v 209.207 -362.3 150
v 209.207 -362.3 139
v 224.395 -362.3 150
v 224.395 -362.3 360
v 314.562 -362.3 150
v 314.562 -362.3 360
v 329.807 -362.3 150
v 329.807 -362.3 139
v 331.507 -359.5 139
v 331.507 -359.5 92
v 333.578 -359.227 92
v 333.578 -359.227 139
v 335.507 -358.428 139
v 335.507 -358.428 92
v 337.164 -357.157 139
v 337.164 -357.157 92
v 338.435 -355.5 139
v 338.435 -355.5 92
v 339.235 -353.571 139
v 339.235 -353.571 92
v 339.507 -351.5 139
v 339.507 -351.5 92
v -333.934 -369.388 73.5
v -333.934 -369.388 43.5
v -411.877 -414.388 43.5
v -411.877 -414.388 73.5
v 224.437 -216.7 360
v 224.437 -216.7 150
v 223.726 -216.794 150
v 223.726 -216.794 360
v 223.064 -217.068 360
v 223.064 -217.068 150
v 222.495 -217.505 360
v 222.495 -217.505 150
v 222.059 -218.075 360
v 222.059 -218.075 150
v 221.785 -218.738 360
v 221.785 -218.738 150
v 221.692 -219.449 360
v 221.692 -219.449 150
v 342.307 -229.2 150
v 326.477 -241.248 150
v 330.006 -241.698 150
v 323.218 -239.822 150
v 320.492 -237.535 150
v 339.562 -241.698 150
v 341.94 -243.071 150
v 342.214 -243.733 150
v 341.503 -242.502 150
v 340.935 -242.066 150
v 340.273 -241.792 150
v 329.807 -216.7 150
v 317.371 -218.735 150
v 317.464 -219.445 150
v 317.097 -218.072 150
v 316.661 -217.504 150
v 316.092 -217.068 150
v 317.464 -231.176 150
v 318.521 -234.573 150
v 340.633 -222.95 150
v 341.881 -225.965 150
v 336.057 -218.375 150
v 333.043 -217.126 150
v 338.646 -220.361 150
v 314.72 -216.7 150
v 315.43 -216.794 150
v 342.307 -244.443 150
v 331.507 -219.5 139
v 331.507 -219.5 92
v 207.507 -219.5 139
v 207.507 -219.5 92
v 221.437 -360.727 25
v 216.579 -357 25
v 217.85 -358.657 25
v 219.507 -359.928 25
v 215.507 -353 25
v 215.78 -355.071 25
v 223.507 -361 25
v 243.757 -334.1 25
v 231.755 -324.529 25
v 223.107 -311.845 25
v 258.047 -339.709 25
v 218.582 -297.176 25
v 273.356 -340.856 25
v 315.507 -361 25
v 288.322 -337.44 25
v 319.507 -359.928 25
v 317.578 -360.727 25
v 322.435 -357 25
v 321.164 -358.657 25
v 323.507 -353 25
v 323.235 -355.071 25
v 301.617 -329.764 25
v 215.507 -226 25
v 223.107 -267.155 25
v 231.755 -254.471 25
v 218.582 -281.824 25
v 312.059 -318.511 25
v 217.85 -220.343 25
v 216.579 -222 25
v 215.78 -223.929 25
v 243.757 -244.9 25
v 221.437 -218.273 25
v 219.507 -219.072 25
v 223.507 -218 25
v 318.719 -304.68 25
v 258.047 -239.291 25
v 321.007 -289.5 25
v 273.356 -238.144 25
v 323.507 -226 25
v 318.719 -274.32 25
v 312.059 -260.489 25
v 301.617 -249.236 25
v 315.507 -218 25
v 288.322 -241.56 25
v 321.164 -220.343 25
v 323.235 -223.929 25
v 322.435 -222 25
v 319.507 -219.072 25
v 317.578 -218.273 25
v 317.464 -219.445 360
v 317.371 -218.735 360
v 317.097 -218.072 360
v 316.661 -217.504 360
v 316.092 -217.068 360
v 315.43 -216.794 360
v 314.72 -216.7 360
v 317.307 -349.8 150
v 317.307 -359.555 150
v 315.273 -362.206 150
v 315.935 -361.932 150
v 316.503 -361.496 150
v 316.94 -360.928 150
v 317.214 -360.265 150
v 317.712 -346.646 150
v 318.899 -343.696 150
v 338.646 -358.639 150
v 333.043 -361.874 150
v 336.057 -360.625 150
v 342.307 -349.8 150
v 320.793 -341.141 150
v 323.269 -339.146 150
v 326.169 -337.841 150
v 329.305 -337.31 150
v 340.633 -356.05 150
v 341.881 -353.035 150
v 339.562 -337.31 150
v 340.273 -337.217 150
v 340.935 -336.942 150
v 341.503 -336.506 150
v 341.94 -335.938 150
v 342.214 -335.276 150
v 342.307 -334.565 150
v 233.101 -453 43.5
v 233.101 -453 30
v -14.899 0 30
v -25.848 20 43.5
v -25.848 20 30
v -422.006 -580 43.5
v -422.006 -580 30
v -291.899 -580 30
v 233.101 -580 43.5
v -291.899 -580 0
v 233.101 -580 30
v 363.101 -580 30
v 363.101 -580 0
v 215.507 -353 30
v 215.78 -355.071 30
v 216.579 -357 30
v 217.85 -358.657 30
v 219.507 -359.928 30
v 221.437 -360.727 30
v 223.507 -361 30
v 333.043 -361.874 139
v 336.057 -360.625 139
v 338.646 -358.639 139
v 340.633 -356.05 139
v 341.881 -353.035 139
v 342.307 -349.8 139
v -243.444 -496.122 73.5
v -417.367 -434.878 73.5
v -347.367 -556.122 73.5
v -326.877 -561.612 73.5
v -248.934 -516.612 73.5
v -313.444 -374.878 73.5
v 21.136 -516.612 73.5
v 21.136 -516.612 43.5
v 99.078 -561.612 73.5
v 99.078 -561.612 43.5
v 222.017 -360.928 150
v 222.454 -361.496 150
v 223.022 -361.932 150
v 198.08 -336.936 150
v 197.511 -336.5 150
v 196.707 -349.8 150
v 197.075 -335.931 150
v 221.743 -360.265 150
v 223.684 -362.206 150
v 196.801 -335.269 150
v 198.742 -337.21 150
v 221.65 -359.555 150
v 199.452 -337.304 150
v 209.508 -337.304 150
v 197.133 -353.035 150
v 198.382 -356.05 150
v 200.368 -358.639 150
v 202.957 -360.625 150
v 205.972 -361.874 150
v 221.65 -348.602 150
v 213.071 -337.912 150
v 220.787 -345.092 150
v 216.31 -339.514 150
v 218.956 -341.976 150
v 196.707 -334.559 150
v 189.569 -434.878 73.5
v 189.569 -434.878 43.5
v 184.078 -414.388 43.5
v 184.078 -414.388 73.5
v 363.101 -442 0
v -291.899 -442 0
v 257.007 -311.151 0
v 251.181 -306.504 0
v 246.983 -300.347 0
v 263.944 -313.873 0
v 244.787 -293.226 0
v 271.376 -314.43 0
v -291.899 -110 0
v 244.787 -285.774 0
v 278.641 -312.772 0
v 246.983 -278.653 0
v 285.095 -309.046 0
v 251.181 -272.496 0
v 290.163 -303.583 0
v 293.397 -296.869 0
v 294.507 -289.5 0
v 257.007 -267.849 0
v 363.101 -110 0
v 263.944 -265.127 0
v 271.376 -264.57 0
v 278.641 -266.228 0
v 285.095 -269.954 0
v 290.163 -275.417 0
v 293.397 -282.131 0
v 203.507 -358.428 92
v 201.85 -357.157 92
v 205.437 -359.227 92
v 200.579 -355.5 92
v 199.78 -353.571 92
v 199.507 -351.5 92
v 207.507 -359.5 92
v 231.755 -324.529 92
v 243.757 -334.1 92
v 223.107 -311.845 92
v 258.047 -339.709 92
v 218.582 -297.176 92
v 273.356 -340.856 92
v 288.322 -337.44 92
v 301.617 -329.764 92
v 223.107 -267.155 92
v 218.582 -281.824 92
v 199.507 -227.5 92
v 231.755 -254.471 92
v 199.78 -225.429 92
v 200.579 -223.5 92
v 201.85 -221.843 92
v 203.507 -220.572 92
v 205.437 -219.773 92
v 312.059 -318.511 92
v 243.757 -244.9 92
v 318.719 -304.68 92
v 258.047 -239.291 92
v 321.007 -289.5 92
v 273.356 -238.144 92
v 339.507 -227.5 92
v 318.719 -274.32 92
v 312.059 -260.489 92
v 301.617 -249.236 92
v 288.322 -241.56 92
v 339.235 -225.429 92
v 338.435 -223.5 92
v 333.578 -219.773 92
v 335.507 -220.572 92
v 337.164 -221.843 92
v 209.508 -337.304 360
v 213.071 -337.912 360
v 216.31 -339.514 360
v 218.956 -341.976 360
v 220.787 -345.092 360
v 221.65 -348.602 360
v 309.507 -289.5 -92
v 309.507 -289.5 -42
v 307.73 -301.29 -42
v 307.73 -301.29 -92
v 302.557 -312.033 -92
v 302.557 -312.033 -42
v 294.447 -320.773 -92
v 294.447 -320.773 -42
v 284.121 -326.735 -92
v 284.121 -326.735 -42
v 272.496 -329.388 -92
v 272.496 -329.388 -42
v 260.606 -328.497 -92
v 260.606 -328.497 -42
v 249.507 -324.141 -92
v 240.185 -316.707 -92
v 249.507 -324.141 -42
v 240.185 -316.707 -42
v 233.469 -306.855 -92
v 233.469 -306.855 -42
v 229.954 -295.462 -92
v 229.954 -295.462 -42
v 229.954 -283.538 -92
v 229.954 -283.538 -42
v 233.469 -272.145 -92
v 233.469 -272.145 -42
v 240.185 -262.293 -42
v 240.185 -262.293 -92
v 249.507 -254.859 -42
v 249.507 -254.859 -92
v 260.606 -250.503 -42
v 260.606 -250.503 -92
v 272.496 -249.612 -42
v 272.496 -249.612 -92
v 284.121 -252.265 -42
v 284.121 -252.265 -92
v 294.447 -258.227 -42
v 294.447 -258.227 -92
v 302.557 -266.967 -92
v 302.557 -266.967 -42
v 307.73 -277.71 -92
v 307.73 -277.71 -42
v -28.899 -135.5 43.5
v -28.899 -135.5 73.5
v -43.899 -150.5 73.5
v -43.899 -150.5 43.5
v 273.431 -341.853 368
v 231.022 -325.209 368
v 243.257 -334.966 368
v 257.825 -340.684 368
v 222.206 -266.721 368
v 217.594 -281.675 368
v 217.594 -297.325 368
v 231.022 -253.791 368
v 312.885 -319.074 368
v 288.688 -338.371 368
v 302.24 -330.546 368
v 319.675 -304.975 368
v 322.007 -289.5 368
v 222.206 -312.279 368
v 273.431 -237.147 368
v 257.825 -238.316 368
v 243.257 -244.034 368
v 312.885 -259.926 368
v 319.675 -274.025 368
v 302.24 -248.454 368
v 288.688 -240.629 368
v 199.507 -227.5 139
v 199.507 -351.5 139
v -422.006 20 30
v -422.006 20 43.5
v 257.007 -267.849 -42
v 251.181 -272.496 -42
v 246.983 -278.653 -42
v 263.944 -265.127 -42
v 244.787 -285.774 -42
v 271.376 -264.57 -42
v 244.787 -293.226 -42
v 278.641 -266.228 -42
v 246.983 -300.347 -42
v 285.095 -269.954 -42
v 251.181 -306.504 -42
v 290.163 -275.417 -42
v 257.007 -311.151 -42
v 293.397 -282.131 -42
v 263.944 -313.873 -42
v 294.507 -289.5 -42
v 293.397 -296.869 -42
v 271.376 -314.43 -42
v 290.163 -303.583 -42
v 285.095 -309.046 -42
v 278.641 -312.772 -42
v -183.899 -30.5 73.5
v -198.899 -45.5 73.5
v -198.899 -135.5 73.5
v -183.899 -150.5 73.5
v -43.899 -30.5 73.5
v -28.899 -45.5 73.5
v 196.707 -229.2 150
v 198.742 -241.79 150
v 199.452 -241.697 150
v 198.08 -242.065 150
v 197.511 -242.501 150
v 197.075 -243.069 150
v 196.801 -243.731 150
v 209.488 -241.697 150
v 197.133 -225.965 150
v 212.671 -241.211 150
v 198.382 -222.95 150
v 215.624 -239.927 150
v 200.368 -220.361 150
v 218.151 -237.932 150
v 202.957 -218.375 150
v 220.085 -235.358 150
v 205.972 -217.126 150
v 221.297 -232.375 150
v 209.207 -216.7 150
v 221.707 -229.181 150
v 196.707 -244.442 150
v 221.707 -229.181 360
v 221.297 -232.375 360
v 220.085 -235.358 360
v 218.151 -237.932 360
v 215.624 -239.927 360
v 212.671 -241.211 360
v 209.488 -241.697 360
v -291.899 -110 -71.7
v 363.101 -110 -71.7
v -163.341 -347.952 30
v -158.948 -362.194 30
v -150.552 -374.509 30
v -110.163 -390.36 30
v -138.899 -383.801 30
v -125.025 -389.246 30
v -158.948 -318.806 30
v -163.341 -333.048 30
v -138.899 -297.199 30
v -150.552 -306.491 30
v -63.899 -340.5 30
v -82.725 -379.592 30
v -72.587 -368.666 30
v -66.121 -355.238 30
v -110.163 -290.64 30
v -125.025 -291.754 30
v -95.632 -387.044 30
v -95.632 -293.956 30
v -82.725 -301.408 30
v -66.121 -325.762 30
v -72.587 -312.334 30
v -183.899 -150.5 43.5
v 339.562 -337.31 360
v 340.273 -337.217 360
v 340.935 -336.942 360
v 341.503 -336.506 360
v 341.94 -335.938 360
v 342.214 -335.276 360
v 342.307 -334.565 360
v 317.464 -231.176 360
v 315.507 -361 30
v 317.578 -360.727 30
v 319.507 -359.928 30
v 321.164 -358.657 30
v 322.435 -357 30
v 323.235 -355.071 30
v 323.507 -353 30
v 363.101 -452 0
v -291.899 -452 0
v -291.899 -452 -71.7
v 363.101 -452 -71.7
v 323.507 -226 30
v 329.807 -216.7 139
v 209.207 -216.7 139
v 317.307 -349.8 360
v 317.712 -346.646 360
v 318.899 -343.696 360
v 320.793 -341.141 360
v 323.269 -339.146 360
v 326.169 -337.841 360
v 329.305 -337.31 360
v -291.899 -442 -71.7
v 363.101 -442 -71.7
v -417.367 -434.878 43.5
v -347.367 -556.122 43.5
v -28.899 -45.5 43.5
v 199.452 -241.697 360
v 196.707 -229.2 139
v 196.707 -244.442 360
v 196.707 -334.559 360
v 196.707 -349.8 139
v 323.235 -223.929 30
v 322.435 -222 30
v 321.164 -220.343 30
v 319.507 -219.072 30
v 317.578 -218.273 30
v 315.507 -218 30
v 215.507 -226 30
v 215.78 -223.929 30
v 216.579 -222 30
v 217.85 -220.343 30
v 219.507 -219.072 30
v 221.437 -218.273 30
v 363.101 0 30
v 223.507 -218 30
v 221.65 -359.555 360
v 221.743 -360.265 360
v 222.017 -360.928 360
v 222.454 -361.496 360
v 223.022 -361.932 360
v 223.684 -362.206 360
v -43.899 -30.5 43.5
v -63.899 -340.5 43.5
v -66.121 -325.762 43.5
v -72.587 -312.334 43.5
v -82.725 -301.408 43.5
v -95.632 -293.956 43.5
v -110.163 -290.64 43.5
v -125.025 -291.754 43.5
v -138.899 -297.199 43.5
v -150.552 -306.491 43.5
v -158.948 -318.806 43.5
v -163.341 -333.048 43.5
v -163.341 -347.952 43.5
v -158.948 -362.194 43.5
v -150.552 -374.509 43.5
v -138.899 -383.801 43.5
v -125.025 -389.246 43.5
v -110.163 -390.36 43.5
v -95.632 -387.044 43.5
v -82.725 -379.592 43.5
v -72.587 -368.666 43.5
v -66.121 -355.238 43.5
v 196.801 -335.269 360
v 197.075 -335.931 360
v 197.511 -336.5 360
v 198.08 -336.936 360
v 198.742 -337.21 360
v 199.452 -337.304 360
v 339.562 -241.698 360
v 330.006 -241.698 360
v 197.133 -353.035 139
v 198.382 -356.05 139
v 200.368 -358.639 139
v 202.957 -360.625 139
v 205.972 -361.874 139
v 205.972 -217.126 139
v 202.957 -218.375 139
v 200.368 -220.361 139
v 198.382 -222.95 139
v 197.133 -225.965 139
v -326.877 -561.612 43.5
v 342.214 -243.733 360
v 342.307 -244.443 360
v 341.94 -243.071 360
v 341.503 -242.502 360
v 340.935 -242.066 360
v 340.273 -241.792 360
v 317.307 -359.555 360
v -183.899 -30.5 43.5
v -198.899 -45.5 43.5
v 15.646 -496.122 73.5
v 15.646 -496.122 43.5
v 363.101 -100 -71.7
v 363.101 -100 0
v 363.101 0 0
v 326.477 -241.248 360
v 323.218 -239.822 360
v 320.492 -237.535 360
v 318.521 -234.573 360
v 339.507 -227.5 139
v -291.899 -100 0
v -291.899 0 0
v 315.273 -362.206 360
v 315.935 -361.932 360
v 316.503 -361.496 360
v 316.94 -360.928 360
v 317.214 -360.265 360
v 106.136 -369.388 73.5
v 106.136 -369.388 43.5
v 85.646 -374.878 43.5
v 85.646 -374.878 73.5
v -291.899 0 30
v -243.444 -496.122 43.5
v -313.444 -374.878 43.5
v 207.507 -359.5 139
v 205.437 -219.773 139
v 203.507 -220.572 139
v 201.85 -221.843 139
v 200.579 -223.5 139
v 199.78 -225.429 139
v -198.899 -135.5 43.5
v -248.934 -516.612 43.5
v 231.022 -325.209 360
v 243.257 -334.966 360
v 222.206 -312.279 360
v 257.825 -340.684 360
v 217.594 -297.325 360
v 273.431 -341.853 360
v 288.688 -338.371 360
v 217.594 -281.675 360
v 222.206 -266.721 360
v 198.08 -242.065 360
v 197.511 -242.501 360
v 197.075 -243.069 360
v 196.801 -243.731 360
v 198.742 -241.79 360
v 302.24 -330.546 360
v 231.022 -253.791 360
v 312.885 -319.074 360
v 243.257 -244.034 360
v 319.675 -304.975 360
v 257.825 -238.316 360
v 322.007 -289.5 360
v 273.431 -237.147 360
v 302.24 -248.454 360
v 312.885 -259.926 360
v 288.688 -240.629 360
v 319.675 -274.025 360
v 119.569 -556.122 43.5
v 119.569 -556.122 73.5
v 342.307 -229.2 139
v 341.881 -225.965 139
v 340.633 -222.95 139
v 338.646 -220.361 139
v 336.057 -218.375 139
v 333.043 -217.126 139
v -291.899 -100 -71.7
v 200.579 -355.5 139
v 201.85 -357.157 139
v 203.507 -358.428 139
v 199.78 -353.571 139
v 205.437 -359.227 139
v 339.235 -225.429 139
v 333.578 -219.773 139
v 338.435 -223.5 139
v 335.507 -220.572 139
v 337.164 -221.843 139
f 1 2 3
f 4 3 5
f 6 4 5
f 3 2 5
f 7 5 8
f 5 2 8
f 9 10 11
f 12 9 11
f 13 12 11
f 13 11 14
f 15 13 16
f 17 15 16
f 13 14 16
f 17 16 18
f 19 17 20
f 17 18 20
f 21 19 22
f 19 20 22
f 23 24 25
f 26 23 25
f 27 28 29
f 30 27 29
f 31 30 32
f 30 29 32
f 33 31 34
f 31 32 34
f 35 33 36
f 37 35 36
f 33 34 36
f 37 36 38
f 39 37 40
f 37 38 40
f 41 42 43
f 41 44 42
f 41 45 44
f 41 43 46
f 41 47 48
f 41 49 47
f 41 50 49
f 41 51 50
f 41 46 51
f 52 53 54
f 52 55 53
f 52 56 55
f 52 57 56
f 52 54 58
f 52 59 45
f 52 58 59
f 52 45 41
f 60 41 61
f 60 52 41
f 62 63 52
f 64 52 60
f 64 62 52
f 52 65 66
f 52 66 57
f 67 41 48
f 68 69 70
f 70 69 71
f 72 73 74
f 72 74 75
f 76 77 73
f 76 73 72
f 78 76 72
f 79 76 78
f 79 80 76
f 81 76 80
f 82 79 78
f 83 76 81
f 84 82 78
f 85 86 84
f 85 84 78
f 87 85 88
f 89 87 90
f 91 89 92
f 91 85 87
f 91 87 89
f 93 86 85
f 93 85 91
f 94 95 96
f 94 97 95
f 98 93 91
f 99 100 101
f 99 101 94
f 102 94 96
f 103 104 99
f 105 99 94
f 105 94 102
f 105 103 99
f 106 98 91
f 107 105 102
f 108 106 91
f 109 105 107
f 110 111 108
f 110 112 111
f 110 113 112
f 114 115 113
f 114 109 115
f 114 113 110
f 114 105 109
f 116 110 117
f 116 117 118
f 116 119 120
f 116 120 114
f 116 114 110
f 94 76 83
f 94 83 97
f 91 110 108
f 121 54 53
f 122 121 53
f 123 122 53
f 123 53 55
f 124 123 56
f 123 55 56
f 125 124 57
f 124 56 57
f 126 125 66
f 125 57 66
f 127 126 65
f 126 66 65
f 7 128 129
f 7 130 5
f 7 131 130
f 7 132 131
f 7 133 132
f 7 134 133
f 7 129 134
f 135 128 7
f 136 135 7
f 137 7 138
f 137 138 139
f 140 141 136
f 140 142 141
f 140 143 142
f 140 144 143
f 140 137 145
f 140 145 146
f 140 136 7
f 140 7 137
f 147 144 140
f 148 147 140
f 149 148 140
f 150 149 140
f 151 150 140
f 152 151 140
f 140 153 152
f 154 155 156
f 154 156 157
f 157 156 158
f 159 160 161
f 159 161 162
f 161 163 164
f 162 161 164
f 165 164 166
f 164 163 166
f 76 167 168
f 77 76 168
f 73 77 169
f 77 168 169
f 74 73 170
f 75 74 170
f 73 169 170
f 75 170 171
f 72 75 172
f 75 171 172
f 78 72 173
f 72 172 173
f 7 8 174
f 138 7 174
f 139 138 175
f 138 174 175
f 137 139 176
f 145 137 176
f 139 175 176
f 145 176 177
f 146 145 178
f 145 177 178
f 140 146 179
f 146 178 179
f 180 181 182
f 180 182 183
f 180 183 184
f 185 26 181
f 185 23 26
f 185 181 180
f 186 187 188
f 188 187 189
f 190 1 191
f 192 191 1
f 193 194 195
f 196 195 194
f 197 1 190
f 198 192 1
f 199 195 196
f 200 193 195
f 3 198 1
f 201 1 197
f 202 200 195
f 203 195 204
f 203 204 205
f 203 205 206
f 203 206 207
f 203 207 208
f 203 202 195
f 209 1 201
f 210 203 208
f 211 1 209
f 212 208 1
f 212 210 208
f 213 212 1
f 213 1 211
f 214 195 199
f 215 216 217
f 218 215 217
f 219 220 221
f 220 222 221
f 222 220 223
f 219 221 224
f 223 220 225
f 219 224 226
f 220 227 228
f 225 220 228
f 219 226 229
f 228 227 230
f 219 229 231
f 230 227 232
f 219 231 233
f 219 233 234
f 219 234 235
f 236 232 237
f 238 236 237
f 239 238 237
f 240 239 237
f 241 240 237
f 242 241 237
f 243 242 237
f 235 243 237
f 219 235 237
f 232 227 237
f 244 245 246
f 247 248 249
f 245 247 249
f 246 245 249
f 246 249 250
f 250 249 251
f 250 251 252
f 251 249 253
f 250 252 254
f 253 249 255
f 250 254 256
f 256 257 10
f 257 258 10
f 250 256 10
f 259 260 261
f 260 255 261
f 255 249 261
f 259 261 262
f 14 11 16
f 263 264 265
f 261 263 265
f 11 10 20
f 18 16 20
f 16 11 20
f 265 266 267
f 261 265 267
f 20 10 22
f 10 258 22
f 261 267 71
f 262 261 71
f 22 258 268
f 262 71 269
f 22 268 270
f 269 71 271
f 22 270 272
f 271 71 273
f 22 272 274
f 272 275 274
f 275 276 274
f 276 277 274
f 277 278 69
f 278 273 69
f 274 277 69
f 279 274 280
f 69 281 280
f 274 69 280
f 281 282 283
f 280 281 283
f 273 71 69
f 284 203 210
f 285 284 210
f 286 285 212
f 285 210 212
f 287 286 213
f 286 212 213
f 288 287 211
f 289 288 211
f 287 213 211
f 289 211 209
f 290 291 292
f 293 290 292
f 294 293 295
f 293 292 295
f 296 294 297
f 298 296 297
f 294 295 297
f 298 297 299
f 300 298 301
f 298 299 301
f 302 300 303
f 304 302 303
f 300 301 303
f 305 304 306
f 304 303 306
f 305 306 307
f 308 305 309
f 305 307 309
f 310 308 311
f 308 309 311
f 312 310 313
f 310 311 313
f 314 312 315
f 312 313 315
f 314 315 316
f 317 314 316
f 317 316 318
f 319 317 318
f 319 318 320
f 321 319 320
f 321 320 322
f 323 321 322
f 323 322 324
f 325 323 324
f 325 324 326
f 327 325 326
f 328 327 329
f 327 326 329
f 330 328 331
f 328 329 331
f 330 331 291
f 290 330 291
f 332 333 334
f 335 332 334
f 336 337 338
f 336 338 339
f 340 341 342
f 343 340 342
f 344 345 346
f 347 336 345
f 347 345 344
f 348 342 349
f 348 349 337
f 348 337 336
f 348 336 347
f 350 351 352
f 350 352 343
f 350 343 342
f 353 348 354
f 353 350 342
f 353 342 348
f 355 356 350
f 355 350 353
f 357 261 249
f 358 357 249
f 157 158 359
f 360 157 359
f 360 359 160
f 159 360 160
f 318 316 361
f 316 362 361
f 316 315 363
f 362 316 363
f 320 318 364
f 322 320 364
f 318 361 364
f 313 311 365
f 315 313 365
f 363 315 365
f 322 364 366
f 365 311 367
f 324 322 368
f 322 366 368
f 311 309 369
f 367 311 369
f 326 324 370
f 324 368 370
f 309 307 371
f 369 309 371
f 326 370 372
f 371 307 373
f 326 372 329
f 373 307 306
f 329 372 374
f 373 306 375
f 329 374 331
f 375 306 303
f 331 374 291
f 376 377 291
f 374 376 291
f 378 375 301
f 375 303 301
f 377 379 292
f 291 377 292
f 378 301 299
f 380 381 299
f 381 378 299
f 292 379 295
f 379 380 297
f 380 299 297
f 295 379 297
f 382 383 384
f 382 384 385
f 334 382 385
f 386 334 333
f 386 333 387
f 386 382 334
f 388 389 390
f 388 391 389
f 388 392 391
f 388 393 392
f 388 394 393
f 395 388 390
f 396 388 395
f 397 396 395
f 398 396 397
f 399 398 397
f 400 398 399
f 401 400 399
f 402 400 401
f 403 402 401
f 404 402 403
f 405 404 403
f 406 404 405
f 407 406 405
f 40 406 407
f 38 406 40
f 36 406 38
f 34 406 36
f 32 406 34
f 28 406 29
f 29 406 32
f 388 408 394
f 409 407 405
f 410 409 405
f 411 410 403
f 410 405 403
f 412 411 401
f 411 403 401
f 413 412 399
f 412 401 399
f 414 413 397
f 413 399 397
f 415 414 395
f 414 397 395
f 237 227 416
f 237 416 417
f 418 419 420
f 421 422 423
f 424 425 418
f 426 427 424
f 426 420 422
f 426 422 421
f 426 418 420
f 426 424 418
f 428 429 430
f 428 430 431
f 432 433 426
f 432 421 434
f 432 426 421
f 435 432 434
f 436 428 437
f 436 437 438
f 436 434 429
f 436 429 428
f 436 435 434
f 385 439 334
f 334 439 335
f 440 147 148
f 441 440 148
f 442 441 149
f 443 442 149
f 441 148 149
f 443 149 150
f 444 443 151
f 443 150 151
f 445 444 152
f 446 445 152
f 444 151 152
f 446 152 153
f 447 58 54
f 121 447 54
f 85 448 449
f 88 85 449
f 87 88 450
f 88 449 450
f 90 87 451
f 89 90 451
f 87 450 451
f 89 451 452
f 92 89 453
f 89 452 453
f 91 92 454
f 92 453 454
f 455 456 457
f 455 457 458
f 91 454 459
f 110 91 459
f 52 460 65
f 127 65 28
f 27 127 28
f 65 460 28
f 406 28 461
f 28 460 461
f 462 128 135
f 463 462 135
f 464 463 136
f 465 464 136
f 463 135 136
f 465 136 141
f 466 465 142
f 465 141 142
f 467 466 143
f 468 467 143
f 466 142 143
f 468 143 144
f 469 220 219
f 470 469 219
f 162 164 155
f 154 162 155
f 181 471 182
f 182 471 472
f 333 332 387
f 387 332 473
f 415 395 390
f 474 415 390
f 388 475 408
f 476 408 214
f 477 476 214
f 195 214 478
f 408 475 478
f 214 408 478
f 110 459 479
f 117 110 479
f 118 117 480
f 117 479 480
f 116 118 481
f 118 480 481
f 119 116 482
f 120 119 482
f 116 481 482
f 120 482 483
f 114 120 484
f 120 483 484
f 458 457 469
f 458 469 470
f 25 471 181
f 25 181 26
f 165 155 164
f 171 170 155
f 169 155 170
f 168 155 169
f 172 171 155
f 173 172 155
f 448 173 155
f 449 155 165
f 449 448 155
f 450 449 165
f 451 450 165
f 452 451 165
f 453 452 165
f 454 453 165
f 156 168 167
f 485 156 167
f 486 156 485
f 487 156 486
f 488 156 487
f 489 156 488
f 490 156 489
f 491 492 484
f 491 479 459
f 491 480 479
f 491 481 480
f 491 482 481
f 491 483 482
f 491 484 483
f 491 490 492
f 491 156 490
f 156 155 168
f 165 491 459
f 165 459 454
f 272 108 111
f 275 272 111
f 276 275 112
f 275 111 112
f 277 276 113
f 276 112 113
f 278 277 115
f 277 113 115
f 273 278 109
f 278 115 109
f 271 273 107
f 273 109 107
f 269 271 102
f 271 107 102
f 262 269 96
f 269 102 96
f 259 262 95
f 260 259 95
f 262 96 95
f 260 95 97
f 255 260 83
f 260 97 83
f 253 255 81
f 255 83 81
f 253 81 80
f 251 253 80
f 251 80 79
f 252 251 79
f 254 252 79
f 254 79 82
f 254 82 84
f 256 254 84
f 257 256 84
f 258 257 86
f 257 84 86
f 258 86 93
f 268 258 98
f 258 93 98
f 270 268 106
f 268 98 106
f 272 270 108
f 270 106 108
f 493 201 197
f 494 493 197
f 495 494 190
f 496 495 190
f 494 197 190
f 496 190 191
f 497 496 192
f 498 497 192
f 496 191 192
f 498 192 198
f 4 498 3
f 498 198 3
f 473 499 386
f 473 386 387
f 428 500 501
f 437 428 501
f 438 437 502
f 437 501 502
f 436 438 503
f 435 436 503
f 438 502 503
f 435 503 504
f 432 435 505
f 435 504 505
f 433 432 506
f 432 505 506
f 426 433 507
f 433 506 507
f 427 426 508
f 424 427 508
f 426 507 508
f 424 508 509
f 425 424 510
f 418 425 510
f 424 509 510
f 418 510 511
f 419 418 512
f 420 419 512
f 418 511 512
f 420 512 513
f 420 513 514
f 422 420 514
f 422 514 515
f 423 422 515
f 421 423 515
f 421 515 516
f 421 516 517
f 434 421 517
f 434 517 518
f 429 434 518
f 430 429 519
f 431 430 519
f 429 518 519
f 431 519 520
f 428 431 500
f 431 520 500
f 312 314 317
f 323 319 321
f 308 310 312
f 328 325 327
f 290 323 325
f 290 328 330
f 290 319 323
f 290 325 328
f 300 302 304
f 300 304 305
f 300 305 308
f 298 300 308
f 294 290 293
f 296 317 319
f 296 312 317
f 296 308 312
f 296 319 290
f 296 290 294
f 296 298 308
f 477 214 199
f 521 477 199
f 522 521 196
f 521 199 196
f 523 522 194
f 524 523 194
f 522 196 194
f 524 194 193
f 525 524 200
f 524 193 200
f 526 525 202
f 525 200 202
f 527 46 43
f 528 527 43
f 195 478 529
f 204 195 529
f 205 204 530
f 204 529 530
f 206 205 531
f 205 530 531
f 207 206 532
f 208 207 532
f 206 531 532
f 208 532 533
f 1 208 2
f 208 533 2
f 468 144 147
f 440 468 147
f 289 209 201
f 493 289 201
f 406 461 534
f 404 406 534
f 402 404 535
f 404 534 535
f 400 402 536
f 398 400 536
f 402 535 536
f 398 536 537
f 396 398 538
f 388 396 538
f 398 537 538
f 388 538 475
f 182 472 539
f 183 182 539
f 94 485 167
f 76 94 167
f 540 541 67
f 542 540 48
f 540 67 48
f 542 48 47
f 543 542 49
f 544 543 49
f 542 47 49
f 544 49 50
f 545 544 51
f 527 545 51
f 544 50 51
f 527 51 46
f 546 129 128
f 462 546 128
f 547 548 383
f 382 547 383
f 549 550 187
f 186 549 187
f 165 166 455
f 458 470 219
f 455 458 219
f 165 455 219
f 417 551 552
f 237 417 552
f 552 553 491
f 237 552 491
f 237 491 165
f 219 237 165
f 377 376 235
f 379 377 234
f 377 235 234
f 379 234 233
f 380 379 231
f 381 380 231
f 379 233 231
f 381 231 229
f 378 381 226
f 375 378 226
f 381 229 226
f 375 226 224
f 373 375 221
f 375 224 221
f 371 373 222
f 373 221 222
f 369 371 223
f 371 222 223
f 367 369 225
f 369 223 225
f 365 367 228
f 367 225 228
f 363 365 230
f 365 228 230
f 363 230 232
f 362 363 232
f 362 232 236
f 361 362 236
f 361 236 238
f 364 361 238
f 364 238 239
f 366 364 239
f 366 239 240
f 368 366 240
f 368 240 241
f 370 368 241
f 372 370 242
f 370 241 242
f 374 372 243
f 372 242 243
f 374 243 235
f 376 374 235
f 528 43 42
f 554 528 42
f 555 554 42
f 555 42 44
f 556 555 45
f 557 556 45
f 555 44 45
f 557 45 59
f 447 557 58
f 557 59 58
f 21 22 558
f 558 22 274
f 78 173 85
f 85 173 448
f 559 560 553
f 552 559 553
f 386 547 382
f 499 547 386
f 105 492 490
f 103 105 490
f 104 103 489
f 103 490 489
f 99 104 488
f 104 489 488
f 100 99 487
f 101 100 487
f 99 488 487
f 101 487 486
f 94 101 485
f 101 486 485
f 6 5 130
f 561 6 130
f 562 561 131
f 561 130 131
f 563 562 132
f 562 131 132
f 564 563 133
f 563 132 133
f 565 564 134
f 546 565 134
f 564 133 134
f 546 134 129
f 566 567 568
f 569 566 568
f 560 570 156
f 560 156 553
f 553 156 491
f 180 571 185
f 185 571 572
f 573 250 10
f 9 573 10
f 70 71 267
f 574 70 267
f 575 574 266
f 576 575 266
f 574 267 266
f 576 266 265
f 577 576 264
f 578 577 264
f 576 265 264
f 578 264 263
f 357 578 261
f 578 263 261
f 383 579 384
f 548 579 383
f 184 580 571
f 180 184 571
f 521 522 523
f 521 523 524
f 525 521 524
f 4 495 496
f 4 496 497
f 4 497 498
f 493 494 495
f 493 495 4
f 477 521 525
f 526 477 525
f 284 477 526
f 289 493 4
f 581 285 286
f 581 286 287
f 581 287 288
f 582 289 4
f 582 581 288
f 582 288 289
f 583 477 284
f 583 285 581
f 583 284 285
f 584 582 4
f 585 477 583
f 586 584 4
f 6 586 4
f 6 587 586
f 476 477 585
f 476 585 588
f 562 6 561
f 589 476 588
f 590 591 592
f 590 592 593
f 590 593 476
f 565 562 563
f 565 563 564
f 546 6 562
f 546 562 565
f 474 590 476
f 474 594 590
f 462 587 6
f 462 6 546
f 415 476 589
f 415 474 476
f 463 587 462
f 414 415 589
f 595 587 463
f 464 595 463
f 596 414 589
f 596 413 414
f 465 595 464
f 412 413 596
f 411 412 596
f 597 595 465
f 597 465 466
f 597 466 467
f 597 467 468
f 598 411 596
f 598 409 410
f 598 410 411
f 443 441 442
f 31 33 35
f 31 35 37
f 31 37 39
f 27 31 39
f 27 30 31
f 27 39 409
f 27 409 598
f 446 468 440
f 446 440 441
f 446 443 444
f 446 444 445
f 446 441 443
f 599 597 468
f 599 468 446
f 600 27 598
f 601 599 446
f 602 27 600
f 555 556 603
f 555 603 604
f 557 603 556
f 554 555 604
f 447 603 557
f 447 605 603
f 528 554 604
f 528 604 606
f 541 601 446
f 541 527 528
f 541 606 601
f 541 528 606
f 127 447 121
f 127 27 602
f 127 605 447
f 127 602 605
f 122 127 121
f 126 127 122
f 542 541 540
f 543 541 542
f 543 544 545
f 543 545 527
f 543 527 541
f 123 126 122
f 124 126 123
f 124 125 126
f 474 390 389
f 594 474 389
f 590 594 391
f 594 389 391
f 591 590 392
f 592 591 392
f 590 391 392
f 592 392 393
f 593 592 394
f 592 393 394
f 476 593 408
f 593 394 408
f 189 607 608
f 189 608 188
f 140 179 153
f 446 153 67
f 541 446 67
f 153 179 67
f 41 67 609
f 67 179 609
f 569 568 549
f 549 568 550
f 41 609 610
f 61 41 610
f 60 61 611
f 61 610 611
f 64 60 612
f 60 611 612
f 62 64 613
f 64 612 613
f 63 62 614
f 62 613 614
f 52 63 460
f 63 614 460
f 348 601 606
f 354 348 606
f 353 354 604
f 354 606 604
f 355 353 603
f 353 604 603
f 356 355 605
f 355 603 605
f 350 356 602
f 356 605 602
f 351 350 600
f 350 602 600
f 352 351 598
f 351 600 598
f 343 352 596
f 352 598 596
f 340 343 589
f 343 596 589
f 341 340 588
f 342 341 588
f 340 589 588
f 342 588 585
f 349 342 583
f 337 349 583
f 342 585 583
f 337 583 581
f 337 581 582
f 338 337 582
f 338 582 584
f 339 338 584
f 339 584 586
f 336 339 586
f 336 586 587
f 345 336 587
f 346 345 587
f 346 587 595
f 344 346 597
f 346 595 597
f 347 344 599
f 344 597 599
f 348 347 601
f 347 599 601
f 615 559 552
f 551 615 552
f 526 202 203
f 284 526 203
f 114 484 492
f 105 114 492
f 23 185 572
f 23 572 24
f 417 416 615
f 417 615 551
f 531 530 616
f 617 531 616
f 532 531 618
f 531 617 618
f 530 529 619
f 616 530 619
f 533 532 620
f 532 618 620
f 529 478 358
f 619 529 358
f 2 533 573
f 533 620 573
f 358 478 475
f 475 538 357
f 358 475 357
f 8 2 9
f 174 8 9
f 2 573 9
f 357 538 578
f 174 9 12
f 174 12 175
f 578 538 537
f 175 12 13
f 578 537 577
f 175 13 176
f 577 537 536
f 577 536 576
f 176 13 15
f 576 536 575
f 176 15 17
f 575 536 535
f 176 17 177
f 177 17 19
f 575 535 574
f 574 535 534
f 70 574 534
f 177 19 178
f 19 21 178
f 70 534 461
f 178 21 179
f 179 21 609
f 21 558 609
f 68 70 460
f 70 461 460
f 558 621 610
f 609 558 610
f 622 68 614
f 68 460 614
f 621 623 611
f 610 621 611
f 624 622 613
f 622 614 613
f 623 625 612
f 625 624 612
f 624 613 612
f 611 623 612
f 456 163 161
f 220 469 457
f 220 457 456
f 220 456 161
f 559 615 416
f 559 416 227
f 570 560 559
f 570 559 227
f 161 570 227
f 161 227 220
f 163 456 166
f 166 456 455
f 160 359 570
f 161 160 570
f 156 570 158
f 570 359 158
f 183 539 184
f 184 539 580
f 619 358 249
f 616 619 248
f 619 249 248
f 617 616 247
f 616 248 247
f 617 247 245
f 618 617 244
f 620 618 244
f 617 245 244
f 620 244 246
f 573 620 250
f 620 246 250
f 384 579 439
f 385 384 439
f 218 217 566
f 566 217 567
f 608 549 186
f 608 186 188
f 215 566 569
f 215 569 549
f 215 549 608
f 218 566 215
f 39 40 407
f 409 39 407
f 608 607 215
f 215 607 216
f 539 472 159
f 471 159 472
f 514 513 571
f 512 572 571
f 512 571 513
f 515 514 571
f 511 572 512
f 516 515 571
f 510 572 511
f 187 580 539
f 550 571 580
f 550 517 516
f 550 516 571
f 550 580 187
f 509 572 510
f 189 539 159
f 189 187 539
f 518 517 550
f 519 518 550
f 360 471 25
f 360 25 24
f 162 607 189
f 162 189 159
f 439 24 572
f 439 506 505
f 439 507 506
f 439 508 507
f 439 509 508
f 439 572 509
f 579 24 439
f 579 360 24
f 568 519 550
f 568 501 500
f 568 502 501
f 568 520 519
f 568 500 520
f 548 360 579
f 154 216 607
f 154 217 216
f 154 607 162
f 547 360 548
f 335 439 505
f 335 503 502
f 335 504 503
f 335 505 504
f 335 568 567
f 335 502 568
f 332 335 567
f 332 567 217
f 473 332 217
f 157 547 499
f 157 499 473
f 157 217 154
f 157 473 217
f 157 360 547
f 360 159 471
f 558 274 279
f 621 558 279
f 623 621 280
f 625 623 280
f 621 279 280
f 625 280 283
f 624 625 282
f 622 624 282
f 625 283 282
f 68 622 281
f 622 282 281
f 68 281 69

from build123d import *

# Parameters (mm, degrees)
F0_W         = 655
F0_H         = 30
F1_DEPTH     = 580
F3_DEPTH     = 13.5
F5_DEPTH     = 5
F6_R         = 51.5
F7_DEPTH     = 67
F9_DEPTH     = 47
F11_DEPTH    = 11
F13_DEPTH    = 210
F14_R        = 52.5
F15_DEPTH    = 8
F16_R        = 50
F17_DEPTH    = 13.5
F18_W        = 170
F18_H        = 120
F19_DEPTH    = 30
F20_SIZE     = 15
F21_T1_DEPTH = 68.5752448195
F22_W        = 655
F22_H        = 10
F23_DEPTH    = 71.7
F24_R        = 25
F25_DEPTH    = 42
F26_R        = 40
F27_DEPTH    = 50


# Not quite as in the source:
# - a fillet or chamfer that OpenCascade refuses, or shapes differently, is made with other operations: its cross-section is extruded or revolved along the edge and cut away or added


with BuildPart() as f1:
    # F0 (on Front) → F1 (new body)
    with BuildSketch(Plane.XZ):
        with Locations((35.6008394094, 15)):
            Rectangle(F0_W, F0_H)
    extrude(amount=F1_DEPTH)

    # F2 (on face) → F3 (join)
    with BuildSketch(Plane.XY.offset(30)):
        Polygon((-422.0060110092, -580), (233.1008394094, -580), (233.1008394094, -453), (-25.8483879637, 20), (-422.0060110092, 20), align=None)
    extrude(amount=F3_DEPTH)

    # F4 (on face) → F5 (cut)
    with BuildSketch(Plane.XY.offset(30)):
        with BuildLine():
            Line((315.5072791576, -218), (223.5072791576, -218))
            ThreePointArc((223.5072791576, -218), (217.8504249081, -220.3431457505), (215.5072791576, -226))
            Line((215.5072791576, -226), (215.5072791576, -353))
            ThreePointArc((215.5072791576, -353), (217.8504249081, -358.6568542495), (223.5072791576, -361))
            Line((223.5072791576, -361), (315.5072791576, -361))
            ThreePointArc((315.5072791576, -361), (321.1641334071, -358.6568542495), (323.5072791576, -353))
            Line((323.5072791576, -353), (323.5072791576, -226))
            ThreePointArc((323.5072791576, -226), (321.1641334071, -220.3431457505), (315.5072791576, -218))
        make_face()
    extrude(amount=-F5_DEPTH, mode=Mode.SUBTRACT)

    # F6 (on face) → F7 (join)
    with BuildSketch(Plane.XY.offset(25)):
        with Locations((269.5072791576, -289.5)):
            Circle(F6_R)
    extrude(amount=F7_DEPTH)

    # F8 (on face) → F9 (join)
    with BuildSketch(Plane.XY.offset(92)):
        with BuildLine():
            Line((331.5072791576, -219.5), (207.5072791576, -219.5))
            ThreePointArc((207.5072791576, -219.5), (201.8504249081, -221.8431457505), (199.5072791576, -227.5))
            Line((199.5072791576, -227.5), (199.5072791576, -351.5))
            ThreePointArc((199.5072791576, -351.5), (201.8504249081, -357.1568542495), (207.5072791576, -359.5))
            Line((207.5072791576, -359.5), (331.5072791576, -359.5))
            ThreePointArc((331.5072791576, -359.5), (337.1641334071, -357.1568542495), (339.5072791576, -351.5))
            Line((339.5072791576, -351.5), (339.5072791576, -227.5))
            ThreePointArc((339.5072791576, -227.5), (337.1641334071, -221.8431457505), (331.5072791576, -219.5))
        make_face()
    extrude(amount=F9_DEPTH)

    # F10 (on face) → F11 (join)
    with BuildSketch(Plane.XY.offset(139)):
        with BuildLine():
            Line((329.8072791576, -216.7), (209.2072791576, -216.7))
            ThreePointArc((209.2072791576, -216.7), (200.3684443928, -220.3611652352), (196.7072791576, -229.2))
            Line((196.7072791576, -229.2), (196.7072791576, -349.8))
            ThreePointArc((196.7072791576, -349.8), (200.3684443928, -358.6388347648), (209.2072791576, -362.3))
            Line((209.2072791576, -362.3), (329.8072791576, -362.3))
            ThreePointArc((329.8072791576, -362.3), (338.6461139225, -358.6388347648), (342.3072791576, -349.8))
            Line((342.3072791576, -349.8), (342.3072791576, -229.2))
            ThreePointArc((342.3072791576, -229.2), (338.6461139225, -220.3611652352), (329.8072791576, -216.7))
        make_face()
    extrude(amount=F11_DEPTH)

    # F12 (on face) → F13 (join)
    with BuildSketch(Plane.XY.offset(150)):
        with BuildLine():
            ThreePointArc((221.6497197978, -359.5550261631), (222.4537040204, -361.4960157773), (224.3946936347, -362.3))
            Line((224.3946936347, -362.3), (314.5623053207, -362.3))
            ThreePointArc((314.5623053207, -362.3), (316.503294935, -361.4960157773), (317.3072791576, -359.5550261631))
            Line((317.3072791576, -359.5550261631), (317.3072791576, -349.8))
            ThreePointArc((317.3072791576, -349.8), (320.7925325094, -341.1406499743), (329.3047740164, -337.3101045407))
            ThreePointArc((329.3047740164, -337.3101045407), (329.8072791576, -337.3), (330.3097842989, -337.3101045407))
            Line((330.3097842989, -337.3101045407), (339.5623053207, -337.3101045407))
            ThreePointArc((339.5623053207, -337.3101045407), (341.503294935, -336.5061203181), (342.3072791576, -334.5651307038))
            Line((342.3072791576, -334.5651307038), (342.3072791576, -244.4433875239))
            ThreePointArc((342.3072791576, -244.4433875239), (341.503294935, -242.5023979096), (339.5623053207, -241.698413687))
            Line((339.5623053207, -241.698413687), (330.006415567, -241.698413687))
            ThreePointArc((330.006415567, -241.698413687), (321.7732212328, -238.7762160199), (317.4644895357, -231.1762450125))
            ThreePointArc((317.4644895357, -231.1762450125), (317.3072791576, -229.2), (317.4644895357, -227.2237549875))
            Line((317.4644895357, -227.2237549875), (317.4644895357, -219.4449738369))
            ThreePointArc((317.4644895357, -219.4449738369), (316.6605053131, -217.5039842227), (314.7195156988, -216.7))
            Line((314.7195156988, -216.7), (224.4374317064, -216.7))
            ThreePointArc((224.4374317064, -216.7), (222.4949663799, -217.5054610577), (221.6924610453, -219.4491493681))
            Line((221.6924610453, -219.4491493681), (221.7072646957, -229.18098556))
            ThreePointArc((221.7072646957, -229.18098556), (218.1514308097, -237.9322477762), (209.4879256393, -241.696849105))
            ThreePointArc((209.4879256393, -241.696849105), (209.2072791576, -241.7), (208.926632676, -241.696849105))
            Line((208.926632676, -241.696849105), (199.4522529946, -241.696849105))
            ThreePointArc((199.4522529946, -241.696849105), (197.5112633803, -242.5008333276), (196.7072791576, -244.4418229419))
            Line((196.7072791576, -244.4418229419), (196.7072791576, -334.5586429094))
            ThreePointArc((196.7072791576, -334.5586429094), (197.5112633803, -336.4996325237), (199.4522529946, -337.3036167464))
            Line((199.4522529946, -337.3036167464), (208.906603954, -337.3036167464))
            ThreePointArc((208.906603954, -337.3036167464), (209.2072791576, -337.3), (209.5079543613, -337.3036167464))
            ThreePointArc((209.5079543613, -337.3036167464), (217.722501739, -340.6489899798), (221.6497197978, -348.6018051423))
            ThreePointArc((221.6497197978, -348.6018051423), (221.7072791576, -349.8), (221.6497197978, -350.9981948577))
            Line((221.6497197978, -350.9981948577), (221.6497197978, -359.5550261631))
        make_face()
        with BuildLine():
            Line((221.6497197978, -348.6018051423), (221.6497197978, -350.9981948577))
            ThreePointArc((221.6497197978, -350.9981948577), (221.7072791576, -349.8), (221.6497197978, -348.6018051423))
        make_face()
        with BuildLine():
            ThreePointArc((330.3097842989, -337.3101045407), (329.8072791576, -337.3), (329.3047740164, -337.3101045407))
            Line((329.3047740164, -337.3101045407), (330.3097842989, -337.3101045407))
        make_face()
        with BuildLine():
            Line((208.906603954, -337.3036167464), (209.5079543613, -337.3036167464))
            ThreePointArc((209.5079543613, -337.3036167464), (209.2072791576, -337.3), (208.906603954, -337.3036167464))
        make_face()
        with BuildLine():
            Line((209.4879256393, -241.696849105), (208.926632676, -241.696849105))
            ThreePointArc((208.926632676, -241.696849105), (209.2072791576, -241.7), (209.4879256393, -241.696849105))
        make_face()
        with BuildLine():
            ThreePointArc((317.4644895357, -227.2237549875), (317.3072791576, -229.2), (317.4644895357, -231.1762450125))
            Line((317.4644895357, -231.1762450125), (317.4644895357, -227.2237549875))
        make_face()
    extrude(amount=F13_DEPTH)

    # F14 (on face) → F15 (join)
    with BuildSketch(Plane.XY.offset(360)):
        with Locations((269.5072791576, -289.5)):
            Circle(F14_R)
    extrude(amount=F15_DEPTH)

    # F16 (on face) → F17 (cut)
    with BuildSketch(Plane.XY.offset(43.5)):
        with Locations((-113.8991605906, -340.5)):
            Circle(F16_R)
    extrude(amount=-F17_DEPTH, mode=Mode.SUBTRACT)

    # F18 (on face) → F19 (join)
    with BuildSketch(Plane.XY.offset(43.5)):
        with Locations((-113.8991605906, -90.5)):
            Rectangle(F18_W, F18_H)
        Polygon((-424.8670357638, -421.8878406783), (-339.8670357638, -569.1121593217), (-235.9439873097, -509.1121593217), (-320.9439873097, -361.8878406783), align=None)
        Polygon((112.0687145825, -569.1121593217), (197.0687145825, -421.8878406783), (93.1456661284, -361.8878406783), (8.1456661284, -509.1121593217), align=None)
    extrude(amount=F19_DEPTH)

    # F20
    f20_edges = [f1.edges().sort_by_distance(p)[0] for p in [
        (-198.899161, -30.5, 58.5),
    ]]
    chamfer(f20_edges, length=F20_SIZE)

    # F21: chamfer of 15 on 11 edges, made by hand

    # F21_s2 → F21_t1 (cut)
    with BuildSketch(Plane.XY.offset(43.5)):
        Polygon((-43.8991605906, -30.5), (-28.8991605906, -45.5), (-28.8991605906, -30.5), align=None)
        Polygon((106.1360471852, -369.3878406783), (85.6456661284, -374.8782217351), (93.1456661284, -361.8878406783), align=None)
        Polygon((15.6456661284, -496.1217782649), (21.1360471852, -516.6121593217), (8.1456661284, -509.1121593217), align=None)
        Polygon((119.5687145825, -556.1217782649), (99.0783335258, -561.6121593217), (112.0687145825, -569.1121593217), align=None)
        Polygon((189.5687145825, -434.8782217351), (184.0783335258, -414.3878406783), (197.0687145825, -421.8878406783), align=None)
        Polygon((-28.8991605906, -135.5), (-43.8991605906, -150.5), (-28.8991605906, -150.5), align=None)
        Polygon((-198.8991605906, -135.5), (-183.8991605906, -150.5), (-198.8991605906, -150.5), align=None)
        Polygon((-248.9343683664, -516.6121593217), (-243.4439873097, -496.1217782649), (-235.9439873097, -509.1121593217), align=None)
        Polygon((-347.3670357638, -556.1217782649), (-326.876654707, -561.6121593217), (-339.8670357638, -569.1121593217), align=None)
        Polygon((-417.3670357638, -434.8782217351), (-411.876654707, -414.3878406783), (-424.8670357638, -421.8878406783), align=None)
        Polygon((-313.4439873097, -374.8782217351), (-333.9343683664, -369.3878406783), (-320.9439873097, -361.8878406783), align=None)
    extrude(amount=F21_T1_DEPTH, mode=Mode.SUBTRACT)

    # F22 (on face) → F23 (join)
    with BuildSketch(Plane(origin=(0, 0, 0), x_dir=(1, 0, 0), z_dir=(0, 0, -1))):
        with Locations((35.6008394094, 105)):
            Rectangle(F22_W, F22_H)
        with Locations((35.6008394094, 447)):
            Rectangle(F22_W, F22_H)
    extrude(amount=F23_DEPTH)

    # F24 (on face) → F25 (join)
    with BuildSketch(Plane(origin=(0, 0, 0), x_dir=(1, 0, 0), z_dir=(0, 0, -1))):
        with Locations((269.5072791576, 289.5)):
            Circle(F24_R)
    extrude(amount=F25_DEPTH)

    # F26 (on face) → F27 (join)
    with BuildSketch(Plane(origin=(0, 0, -42), x_dir=(1, 0, 0), z_dir=(0, 0, -1))):
        with Locations((269.5072791576, 289.5)):
            Circle(F26_R)
    extrude(amount=F27_DEPTH)


solid = f1.part
